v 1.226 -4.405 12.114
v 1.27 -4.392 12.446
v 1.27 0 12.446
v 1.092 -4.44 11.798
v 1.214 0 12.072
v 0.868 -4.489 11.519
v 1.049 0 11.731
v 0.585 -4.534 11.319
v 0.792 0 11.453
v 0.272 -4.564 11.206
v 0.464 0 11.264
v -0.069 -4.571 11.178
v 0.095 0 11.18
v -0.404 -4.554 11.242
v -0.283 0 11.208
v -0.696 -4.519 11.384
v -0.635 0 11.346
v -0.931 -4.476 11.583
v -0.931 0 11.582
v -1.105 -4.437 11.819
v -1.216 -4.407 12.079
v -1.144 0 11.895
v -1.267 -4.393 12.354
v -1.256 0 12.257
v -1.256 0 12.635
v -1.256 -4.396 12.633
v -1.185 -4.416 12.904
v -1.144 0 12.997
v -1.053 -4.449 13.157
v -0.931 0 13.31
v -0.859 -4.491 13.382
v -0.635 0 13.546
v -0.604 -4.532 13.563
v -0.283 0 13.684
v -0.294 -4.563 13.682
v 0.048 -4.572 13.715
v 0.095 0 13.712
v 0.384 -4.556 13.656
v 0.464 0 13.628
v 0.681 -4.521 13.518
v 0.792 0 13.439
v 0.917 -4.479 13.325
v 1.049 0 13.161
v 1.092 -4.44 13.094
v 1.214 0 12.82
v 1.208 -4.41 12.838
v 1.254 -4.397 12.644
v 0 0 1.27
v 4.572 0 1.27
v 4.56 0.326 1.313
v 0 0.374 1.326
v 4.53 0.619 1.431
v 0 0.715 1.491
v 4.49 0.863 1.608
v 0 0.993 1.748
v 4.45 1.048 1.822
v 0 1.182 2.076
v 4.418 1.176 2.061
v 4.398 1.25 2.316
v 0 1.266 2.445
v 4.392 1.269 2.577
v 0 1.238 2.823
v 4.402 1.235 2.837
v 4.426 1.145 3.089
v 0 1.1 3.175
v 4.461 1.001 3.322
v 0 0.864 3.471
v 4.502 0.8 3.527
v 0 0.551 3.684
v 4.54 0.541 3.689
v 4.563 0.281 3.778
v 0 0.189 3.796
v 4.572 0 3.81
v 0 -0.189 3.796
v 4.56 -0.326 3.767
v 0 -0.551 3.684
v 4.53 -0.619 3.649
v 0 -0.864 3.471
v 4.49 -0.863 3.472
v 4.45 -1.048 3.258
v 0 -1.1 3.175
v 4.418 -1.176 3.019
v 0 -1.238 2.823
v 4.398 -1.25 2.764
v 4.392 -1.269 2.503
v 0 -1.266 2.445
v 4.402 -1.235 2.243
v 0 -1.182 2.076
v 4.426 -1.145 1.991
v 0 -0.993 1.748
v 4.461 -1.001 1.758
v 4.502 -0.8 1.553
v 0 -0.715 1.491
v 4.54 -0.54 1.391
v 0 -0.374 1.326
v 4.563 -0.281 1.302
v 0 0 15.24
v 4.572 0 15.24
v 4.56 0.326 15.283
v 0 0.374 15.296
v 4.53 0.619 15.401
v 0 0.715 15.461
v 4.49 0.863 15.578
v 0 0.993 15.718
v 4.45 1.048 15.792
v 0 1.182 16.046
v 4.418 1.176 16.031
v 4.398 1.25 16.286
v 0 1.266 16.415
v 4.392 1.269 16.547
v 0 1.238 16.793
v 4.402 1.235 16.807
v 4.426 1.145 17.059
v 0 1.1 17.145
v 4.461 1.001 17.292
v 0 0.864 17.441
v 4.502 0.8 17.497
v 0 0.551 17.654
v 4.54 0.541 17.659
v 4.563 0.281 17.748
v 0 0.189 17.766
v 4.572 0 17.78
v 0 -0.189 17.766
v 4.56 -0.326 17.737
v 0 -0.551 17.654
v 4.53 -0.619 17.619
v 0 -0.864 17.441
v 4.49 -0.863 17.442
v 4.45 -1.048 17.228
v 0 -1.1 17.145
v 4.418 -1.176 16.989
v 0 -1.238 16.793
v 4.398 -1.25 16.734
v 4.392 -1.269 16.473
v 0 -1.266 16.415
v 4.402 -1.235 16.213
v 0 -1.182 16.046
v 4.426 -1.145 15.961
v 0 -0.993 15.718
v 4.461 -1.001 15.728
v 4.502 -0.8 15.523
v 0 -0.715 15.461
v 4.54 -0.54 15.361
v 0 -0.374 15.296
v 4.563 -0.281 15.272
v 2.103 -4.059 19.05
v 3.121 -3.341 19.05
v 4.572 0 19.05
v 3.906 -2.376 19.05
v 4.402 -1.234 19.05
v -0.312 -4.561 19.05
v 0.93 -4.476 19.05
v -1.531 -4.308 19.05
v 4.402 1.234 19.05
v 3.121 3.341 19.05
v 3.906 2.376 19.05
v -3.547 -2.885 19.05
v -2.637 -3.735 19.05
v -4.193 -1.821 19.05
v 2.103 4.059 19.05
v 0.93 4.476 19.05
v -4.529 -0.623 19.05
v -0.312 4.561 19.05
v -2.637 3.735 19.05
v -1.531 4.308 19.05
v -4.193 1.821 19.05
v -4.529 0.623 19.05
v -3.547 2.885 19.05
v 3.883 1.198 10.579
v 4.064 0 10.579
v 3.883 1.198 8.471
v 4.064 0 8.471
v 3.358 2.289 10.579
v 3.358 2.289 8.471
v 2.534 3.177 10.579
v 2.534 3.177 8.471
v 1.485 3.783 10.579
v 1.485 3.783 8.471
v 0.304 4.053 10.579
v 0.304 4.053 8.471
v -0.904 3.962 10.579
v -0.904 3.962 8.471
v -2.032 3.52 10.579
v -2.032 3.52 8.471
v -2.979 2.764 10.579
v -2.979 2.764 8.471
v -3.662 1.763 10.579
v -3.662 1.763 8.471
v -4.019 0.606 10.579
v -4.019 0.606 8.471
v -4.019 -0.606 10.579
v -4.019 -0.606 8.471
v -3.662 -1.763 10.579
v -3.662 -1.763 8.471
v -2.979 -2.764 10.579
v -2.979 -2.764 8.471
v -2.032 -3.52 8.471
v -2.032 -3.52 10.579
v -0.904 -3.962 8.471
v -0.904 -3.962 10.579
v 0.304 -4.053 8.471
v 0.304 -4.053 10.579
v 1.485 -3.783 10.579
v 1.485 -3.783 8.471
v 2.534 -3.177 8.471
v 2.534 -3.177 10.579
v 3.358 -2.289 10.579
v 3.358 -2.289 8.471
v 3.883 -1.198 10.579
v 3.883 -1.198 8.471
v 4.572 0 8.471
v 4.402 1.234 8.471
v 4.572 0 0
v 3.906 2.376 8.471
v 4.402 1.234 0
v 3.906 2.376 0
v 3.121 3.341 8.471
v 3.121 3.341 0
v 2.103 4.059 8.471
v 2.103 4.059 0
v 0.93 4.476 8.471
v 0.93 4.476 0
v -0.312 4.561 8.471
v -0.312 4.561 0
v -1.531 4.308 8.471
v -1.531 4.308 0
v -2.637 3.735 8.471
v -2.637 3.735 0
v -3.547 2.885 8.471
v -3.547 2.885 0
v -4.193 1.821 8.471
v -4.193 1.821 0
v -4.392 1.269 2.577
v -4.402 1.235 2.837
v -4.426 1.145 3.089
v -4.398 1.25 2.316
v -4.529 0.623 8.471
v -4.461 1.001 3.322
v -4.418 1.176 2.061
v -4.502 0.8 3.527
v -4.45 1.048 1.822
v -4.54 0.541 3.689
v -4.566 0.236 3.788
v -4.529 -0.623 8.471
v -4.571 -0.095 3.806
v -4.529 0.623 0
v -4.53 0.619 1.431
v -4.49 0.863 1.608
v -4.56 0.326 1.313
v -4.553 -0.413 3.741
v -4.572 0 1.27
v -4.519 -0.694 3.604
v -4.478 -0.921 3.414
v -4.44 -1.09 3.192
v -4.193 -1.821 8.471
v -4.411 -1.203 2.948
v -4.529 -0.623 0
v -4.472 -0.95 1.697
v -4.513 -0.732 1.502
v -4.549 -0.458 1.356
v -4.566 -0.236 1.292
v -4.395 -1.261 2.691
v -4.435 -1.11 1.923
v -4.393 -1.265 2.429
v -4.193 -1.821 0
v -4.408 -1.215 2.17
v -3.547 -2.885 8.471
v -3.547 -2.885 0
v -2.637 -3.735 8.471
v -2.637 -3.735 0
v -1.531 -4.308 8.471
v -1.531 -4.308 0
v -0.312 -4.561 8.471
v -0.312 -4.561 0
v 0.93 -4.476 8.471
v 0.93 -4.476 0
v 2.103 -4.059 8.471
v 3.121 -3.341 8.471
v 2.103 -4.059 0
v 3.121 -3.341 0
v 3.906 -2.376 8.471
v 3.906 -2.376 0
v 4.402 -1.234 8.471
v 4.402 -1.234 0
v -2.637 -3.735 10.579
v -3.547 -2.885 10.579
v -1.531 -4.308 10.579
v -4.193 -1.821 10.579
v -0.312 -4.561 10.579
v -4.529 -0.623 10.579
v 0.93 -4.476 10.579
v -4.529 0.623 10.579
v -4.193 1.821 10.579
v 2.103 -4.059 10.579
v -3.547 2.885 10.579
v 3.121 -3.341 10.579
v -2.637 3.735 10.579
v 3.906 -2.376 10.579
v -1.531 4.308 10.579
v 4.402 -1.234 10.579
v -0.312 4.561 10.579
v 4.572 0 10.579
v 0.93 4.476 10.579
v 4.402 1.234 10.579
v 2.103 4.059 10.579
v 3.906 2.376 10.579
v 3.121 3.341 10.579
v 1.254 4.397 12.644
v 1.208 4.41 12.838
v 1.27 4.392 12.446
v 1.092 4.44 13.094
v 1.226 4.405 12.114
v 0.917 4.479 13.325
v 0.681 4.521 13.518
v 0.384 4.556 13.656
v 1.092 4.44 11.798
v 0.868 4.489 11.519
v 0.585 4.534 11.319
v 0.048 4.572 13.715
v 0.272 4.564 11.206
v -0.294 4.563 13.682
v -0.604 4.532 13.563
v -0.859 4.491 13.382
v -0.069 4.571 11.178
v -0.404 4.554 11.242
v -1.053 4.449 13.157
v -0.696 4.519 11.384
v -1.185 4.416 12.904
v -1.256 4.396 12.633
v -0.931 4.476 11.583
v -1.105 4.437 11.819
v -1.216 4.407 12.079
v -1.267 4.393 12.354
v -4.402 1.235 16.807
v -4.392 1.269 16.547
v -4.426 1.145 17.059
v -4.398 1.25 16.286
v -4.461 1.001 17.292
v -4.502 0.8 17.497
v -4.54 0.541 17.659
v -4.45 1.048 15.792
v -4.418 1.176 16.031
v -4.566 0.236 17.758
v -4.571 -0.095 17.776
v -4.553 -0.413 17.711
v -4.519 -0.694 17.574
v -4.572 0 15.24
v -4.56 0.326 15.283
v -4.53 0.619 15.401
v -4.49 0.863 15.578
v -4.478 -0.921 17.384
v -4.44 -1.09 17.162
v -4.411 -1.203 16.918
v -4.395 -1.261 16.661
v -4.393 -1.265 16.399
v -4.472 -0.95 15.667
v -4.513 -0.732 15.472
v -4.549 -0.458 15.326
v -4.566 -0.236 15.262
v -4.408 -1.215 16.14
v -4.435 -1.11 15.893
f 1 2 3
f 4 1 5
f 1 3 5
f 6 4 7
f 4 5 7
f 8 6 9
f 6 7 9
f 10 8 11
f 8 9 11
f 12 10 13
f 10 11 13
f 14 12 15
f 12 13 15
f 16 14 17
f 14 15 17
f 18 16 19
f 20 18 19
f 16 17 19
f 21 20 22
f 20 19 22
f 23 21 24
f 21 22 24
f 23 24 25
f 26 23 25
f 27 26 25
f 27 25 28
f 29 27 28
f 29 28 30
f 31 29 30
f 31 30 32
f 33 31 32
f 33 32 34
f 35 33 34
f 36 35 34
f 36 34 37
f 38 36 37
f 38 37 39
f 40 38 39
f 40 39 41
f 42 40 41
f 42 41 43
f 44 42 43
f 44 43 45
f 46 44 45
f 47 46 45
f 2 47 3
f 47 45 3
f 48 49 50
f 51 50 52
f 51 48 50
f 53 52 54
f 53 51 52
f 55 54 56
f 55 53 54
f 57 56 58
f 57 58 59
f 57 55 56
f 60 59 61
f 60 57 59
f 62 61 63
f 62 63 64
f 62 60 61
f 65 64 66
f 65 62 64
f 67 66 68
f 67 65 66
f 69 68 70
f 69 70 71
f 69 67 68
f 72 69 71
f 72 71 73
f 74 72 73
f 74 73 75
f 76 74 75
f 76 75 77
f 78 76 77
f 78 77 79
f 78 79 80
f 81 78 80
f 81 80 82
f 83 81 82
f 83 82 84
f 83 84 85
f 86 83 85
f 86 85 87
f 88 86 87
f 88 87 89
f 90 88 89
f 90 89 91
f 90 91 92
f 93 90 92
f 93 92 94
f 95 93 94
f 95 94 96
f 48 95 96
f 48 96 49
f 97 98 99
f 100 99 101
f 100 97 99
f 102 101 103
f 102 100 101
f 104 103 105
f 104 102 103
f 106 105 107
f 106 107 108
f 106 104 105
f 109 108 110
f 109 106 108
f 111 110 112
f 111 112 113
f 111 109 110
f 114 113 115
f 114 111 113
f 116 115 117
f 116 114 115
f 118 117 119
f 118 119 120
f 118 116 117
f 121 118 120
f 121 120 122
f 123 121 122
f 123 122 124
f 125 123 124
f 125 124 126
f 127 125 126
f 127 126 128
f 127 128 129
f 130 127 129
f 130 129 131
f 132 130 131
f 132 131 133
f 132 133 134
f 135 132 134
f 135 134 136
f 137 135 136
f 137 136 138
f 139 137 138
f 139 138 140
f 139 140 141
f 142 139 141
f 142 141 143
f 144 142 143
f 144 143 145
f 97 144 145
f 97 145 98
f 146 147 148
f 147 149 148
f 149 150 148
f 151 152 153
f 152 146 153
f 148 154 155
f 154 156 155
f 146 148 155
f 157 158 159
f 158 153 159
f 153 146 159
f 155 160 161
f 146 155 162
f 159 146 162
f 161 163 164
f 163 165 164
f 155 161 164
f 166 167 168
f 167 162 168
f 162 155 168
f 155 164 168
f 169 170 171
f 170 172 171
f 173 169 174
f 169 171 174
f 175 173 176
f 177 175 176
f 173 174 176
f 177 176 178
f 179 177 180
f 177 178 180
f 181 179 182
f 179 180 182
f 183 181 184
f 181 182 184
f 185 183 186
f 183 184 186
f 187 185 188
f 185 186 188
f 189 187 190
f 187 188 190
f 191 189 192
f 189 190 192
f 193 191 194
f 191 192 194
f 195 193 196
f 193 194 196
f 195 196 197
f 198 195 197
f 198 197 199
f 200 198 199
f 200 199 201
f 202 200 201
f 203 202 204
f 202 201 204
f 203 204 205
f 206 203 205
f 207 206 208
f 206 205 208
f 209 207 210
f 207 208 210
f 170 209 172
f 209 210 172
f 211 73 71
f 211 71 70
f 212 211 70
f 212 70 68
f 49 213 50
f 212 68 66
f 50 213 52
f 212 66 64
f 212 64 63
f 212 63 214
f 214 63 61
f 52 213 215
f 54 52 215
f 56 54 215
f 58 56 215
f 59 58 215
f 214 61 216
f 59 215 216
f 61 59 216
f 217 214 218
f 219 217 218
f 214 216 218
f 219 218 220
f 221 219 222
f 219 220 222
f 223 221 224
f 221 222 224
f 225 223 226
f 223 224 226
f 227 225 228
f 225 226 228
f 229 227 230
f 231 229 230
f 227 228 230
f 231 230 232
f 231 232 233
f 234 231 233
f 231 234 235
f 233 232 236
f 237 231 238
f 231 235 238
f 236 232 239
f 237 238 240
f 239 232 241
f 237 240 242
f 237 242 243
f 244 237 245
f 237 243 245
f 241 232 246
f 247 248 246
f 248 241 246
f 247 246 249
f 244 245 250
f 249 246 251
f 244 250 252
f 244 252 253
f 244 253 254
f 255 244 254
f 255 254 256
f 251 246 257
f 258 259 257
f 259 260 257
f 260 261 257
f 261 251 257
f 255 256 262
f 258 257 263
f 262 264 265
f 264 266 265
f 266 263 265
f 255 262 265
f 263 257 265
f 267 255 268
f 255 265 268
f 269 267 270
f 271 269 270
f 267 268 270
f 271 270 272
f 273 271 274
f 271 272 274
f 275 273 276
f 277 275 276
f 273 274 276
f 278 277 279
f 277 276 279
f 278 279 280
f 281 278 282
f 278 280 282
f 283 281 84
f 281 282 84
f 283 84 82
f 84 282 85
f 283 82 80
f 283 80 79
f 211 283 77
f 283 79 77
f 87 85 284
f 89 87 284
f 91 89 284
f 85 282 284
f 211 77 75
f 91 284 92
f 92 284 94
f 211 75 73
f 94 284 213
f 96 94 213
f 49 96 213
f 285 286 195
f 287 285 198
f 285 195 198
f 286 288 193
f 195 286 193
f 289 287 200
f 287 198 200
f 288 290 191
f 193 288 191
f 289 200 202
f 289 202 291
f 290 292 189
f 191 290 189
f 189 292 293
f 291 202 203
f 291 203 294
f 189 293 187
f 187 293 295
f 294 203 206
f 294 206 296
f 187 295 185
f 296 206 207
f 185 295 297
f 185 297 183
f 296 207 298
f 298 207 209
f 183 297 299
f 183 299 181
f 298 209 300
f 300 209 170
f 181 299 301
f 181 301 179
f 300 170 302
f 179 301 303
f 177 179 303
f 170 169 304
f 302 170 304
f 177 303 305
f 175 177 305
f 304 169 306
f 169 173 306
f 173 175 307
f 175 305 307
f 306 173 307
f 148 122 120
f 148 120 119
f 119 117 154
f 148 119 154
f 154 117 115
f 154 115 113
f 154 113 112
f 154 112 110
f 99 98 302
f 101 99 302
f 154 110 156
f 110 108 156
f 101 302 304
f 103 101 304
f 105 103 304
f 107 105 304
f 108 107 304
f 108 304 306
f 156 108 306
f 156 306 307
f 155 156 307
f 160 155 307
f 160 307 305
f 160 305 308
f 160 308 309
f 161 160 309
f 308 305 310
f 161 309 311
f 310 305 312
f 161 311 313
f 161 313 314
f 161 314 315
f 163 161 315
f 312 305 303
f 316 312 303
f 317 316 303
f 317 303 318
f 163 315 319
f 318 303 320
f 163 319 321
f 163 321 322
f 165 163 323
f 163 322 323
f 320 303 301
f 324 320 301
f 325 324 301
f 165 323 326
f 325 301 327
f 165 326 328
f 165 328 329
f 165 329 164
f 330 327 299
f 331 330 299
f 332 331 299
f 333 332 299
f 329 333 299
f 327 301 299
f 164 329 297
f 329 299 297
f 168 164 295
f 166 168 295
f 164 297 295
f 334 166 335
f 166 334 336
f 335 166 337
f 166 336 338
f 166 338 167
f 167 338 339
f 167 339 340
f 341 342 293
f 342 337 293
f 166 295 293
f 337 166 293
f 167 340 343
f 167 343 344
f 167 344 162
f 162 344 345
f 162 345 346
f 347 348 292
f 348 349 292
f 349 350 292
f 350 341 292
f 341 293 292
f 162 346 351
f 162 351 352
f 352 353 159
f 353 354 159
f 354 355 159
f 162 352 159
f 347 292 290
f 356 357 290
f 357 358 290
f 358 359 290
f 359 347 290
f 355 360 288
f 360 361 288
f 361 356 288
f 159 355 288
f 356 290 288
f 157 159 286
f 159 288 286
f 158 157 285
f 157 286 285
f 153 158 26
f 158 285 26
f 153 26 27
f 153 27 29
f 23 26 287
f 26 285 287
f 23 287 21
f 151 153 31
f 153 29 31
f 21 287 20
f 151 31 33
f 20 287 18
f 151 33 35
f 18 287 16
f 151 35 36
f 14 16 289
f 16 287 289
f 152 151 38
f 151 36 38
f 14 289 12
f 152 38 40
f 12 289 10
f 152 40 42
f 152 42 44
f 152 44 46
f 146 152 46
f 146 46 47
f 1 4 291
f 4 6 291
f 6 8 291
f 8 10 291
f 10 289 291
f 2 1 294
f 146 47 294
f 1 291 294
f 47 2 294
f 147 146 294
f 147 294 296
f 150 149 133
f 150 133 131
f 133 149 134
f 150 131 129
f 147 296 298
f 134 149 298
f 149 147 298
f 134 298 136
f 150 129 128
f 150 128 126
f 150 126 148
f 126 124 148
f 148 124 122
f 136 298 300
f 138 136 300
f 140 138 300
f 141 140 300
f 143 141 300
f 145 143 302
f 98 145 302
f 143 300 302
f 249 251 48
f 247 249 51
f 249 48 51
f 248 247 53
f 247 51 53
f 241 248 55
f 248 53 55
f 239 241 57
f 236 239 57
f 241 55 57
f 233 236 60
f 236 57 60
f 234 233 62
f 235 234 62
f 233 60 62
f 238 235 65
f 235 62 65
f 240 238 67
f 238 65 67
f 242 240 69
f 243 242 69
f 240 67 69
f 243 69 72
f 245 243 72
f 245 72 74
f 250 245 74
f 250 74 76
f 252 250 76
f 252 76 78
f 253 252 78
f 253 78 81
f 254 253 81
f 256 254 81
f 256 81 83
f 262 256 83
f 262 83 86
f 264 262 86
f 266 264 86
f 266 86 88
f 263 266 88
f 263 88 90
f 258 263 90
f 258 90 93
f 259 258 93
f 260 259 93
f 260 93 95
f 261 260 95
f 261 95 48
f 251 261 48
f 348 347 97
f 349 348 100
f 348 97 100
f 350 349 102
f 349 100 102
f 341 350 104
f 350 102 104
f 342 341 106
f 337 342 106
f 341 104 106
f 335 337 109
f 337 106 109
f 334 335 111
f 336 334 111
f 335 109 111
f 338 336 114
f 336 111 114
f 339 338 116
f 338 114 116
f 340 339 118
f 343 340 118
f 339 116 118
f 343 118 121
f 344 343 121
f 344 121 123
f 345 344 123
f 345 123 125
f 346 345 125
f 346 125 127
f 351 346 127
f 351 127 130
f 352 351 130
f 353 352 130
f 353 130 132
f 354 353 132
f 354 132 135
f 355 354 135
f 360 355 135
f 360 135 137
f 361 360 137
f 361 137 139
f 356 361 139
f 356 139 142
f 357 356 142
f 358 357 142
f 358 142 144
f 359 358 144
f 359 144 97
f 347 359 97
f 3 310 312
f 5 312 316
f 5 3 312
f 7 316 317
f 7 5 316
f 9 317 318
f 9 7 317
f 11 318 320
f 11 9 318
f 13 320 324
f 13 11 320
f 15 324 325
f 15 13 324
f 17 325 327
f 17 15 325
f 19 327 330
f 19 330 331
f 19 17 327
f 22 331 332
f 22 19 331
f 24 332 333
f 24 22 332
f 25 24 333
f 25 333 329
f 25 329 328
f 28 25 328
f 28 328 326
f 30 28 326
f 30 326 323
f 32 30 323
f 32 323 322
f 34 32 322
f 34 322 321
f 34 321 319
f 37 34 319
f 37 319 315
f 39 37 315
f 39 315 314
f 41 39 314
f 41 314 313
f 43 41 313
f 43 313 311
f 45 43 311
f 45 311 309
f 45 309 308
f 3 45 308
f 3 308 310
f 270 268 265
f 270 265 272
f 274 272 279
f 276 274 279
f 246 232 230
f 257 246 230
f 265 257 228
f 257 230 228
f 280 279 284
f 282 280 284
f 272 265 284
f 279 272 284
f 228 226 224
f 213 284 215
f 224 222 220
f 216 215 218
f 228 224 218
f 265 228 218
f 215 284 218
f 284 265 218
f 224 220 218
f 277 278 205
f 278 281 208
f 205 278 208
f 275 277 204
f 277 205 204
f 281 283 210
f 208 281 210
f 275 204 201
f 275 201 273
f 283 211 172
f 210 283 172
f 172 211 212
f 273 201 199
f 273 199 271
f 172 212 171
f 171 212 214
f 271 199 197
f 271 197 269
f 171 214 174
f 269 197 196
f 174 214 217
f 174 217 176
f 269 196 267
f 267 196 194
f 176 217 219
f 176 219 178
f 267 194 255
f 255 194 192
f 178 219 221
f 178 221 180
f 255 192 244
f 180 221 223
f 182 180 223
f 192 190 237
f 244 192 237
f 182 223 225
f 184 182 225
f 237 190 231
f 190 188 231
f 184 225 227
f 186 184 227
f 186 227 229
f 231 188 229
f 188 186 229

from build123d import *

# Parameters (mm, degrees)
SKETCH3_R               = 1.27
CUT_EXTRUDE1_DEPTH      = 5.572
CUT_EXTRUDE1_DEPTH_BACK = 5.572
SKETCH4_R               = 1.27
CUT_EXTRUDE2_DEPTH      = 5.5720001
CUT_EXTRUDE2_DEPTH_BACK = 5.5720001


with BuildPart() as part:
    # Sketch2 → Revolve1 (revolve)
    with BuildSketch(Plane(origin=(0, 0, 0), x_dir=(1, 0, 0), z_dir=(0, 1, 0))):
        Polygon((0, 0), (0, -19.05), (4.572, -19.05), (4.572, -10.5791), (4.064, -10.5791), (4.064, -8.4709), (4.572, -8.4709), (4.572, 0), align=None)
    revolve(axis=Axis((0, 0, 0), (0, 0, 1)))

    # Sketch3 → Cut-Extrude1 (cut, two sides)
    with BuildSketch(Plane(origin=(0, 0, 0), x_dir=(1, 0, 0), z_dir=(0, 1, 0))) as cut_extrude1_sk:
        with Locations((0, -12.446)):
            Circle(SKETCH3_R)
    extrude(amount=CUT_EXTRUDE1_DEPTH, mode=Mode.SUBTRACT)
    extrude(cut_extrude1_sk.sketch, amount=-CUT_EXTRUDE1_DEPTH_BACK, mode=Mode.SUBTRACT)

    # Sketch4 → Cut-Extrude2 (cut, two sides)
    with BuildSketch(Plane(origin=(0, 0, 0), x_dir=(0, 0, -1), z_dir=(1, 0, 0))) as cut_extrude2_sk:
        with Locations((-2.54, 0)):
            Circle(SKETCH4_R)
        with Locations((-16.51, 0)):
            Circle(SKETCH4_R)
    extrude(amount=CUT_EXTRUDE2_DEPTH, mode=Mode.SUBTRACT)
    extrude(cut_extrude2_sk.sketch, amount=-CUT_EXTRUDE2_DEPTH_BACK, mode=Mode.SUBTRACT)


solid = part.part
